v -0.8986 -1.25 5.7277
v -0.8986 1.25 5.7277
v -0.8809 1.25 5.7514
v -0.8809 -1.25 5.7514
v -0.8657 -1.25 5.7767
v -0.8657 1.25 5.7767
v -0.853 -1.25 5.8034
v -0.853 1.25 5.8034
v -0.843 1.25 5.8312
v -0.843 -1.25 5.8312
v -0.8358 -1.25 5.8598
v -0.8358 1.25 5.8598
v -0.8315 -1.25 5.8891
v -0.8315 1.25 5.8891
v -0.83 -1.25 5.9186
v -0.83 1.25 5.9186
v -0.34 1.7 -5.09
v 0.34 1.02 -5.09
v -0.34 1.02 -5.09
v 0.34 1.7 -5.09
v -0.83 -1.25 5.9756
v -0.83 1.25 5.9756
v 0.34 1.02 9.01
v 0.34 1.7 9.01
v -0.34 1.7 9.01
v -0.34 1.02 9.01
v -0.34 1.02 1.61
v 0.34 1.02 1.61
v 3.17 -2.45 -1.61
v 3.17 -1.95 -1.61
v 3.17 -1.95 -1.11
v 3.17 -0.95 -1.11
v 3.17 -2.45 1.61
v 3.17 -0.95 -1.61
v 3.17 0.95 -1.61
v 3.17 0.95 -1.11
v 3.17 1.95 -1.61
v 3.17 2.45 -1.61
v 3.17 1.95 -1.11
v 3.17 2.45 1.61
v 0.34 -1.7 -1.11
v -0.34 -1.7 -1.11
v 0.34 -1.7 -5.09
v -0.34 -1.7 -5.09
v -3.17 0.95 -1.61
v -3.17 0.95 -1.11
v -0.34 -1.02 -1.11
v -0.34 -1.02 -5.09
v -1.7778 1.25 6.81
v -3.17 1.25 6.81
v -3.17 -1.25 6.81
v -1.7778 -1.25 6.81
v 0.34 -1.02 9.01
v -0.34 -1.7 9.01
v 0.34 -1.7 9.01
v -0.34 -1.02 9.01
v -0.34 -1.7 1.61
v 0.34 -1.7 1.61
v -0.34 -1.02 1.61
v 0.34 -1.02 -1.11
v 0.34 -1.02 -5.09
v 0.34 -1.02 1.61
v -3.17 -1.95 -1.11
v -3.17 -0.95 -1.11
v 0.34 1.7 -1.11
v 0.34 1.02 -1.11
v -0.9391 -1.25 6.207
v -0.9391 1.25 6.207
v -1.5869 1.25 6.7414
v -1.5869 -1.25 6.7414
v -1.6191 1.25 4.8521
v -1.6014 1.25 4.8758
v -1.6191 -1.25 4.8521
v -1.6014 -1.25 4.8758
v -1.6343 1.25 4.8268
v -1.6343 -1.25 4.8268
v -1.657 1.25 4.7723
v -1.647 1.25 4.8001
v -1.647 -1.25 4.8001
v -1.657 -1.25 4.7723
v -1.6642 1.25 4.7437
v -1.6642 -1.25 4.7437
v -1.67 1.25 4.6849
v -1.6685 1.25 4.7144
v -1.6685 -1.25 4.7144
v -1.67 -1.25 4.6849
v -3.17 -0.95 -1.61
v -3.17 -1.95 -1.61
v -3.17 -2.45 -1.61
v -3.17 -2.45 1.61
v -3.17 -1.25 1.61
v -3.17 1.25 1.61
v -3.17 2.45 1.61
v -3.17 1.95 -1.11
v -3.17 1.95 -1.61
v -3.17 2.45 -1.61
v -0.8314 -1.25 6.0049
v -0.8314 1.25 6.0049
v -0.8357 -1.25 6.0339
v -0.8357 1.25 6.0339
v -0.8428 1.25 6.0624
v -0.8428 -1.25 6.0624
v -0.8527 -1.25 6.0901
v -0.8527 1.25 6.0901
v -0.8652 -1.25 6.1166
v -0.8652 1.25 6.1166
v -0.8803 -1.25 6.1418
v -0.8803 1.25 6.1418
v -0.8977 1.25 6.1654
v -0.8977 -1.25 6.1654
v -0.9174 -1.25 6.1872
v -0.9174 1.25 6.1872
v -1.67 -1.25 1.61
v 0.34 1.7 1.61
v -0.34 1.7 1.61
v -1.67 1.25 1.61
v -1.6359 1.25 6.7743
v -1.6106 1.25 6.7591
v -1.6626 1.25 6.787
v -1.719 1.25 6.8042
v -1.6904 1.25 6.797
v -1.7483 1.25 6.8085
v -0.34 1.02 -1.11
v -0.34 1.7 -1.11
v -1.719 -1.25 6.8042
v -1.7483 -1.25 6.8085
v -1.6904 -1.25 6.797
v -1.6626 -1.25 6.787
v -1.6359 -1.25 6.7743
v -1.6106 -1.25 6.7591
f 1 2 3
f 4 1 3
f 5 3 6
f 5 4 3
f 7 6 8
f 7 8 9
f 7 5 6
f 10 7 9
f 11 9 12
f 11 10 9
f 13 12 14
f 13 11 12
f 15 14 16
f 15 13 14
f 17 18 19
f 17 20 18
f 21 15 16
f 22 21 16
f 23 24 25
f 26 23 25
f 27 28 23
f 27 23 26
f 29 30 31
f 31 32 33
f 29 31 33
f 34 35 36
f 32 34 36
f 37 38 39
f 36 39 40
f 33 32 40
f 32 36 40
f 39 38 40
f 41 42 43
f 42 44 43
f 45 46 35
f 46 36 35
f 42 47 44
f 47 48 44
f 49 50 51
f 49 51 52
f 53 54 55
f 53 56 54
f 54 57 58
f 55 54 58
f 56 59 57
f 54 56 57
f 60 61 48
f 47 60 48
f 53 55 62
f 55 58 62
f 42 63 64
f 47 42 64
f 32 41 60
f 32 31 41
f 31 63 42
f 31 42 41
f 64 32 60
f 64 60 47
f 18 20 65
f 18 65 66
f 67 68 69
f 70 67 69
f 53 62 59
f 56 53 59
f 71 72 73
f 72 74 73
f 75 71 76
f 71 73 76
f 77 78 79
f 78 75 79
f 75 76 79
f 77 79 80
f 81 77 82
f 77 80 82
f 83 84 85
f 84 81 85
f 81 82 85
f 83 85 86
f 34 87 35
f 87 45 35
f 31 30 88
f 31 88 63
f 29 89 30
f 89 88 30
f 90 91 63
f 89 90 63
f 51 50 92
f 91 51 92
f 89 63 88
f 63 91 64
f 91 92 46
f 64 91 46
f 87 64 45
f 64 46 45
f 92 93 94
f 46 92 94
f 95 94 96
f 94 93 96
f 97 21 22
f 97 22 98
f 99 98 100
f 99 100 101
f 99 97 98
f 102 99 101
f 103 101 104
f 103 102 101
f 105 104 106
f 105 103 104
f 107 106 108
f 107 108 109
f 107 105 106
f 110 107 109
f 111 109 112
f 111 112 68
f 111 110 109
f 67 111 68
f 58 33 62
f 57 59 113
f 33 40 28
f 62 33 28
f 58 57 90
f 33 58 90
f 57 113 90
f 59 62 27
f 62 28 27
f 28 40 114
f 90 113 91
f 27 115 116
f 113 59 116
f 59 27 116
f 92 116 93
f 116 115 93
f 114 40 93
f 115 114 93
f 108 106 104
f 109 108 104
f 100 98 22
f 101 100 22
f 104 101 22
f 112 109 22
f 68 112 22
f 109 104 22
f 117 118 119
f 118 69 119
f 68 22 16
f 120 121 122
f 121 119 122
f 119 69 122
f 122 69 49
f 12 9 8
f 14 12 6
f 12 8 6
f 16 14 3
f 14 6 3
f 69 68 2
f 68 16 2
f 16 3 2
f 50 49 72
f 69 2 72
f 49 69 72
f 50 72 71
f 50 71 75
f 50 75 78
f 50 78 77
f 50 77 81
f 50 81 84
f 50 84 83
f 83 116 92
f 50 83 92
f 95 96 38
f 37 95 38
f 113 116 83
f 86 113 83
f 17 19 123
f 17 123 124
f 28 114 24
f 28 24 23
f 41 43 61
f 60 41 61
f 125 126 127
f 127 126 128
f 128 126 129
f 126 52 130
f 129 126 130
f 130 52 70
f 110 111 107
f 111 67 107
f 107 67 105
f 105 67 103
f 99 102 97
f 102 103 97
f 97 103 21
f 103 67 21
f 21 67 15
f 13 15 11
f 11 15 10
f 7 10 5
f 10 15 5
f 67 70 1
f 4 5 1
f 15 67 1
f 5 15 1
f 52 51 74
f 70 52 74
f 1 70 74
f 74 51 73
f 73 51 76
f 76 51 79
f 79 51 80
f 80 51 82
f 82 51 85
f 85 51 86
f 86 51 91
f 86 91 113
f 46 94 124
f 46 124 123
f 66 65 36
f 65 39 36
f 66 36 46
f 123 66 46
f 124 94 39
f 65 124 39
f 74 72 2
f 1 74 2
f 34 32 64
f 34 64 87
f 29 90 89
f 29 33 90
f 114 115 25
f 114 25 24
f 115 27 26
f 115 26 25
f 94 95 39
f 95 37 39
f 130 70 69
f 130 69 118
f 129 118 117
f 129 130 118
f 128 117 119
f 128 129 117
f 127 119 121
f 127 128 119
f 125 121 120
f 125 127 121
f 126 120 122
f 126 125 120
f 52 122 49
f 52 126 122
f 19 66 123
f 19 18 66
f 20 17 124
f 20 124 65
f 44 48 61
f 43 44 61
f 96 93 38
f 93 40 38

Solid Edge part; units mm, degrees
sketch "Sketch1" plane through (0, 0, 0) normal (0, -1, 0) x (1, 0, 0)
  line L0 (-3.17, -1.61) -> (3.17, -1.61)
  line L1 (3.17, -1.61) -> (3.17, 1.61)
  line L2 (3.17, 1.61) -> (-3.17, 1.61)
  line L3 (-3.17, 1.61) -> (-3.17, -1.61)
extrude "Protrusion1" add sketch "Sketch1" along normal mid plane 4.9
sketch "Sketch2" plane through (0, 0, 1.61) normal (0, 0, 1) x (1, 0, 0)
  line L0 (-3.17, -1.25) -> (-0.83, -1.25)
  line L1 (-0.83, -1.25) -> (-0.83, 1.25)
  line L2 (-0.83, 1.25) -> (-3.17, 1.25)
  line L3 (-3.17, 1.25) -> (-3.17, -1.25)
  dimension "D1" = 2.34
extrude "ExtrudedProtrusion_2" add sketch "Sketch2" along normal blind 5.2 and the other way blind 1.7629
sketch "Sketch3" plane through (3.17, 0, 0) normal (1, 0, 0) x (0, 1, 0)
  line L0 (-1.95, -1.11) -> (-0.95, -1.11)
  line L1 (-0.95, -1.11) -> (-0.95, -1.61)
  line L2 (-0.95, -1.61) -> (-1.95, -1.61)
  line L3 (-1.95, -1.61) -> (-1.95, -1.11)
  line L4 (1.95, -1.11) -> (0.95, -1.11)
  line L5 (0.95, -1.11) -> (0.95, -1.61)
  line L6 (0.95, -1.61) -> (1.95, -1.61)
  line L7 (1.95, -1.61) -> (1.95, -1.11)
  dimension "D1" = 1
  dimension "D2" = 0.5
  dimension "D3" = 0.5
extrude "Cutout1" cut sketch "Sketch3" against normal up to surface (6.34 mm away)
sketch "Sketch4" plane through (0, 0, 1.61) normal (0, 0, 1) x (0, 1, 0)
  line L0 (-1.7, -0.34) -> (-1.02, -0.34)
  line L1 (-1.02, -0.34) -> (-1.02, 0.34)
  line L2 (-1.02, 0.34) -> (-1.7, 0.34)
  line L3 (-1.7, 0.34) -> (-1.7, -0.34)
  line L4 (1.7, -0.34) -> (1.02, -0.34)
  line L5 (1.02, -0.34) -> (1.02, 0.34)
  line L6 (1.02, 0.34) -> (1.7, 0.34)
  line L7 (1.7, 0.34) -> (1.7, -0.34)
  dimension "D1" = 0.68
  dimension "D2" = 0.68
  dimension "D3" = 0.75
extrude "ExtrudedProtrusion_3" add sketch "Sketch4" along normal blind 7.4 and the other way blind 6.7
sketch "Sketch5" plane through (-2, 1.25, 4.21) normal (0, 1, 0) x (-1, 0, 0)
  line L0 (-0.33, 2.6) -> (-1.17, 2.6)
  line L1 (-1.17, 2.6) -> (-1.17, 1.907)
  line L2 (-1.17, 1.907) -> (-0.33, 2.6)
  line L3 (-0.33, 0.5827) -> (-1.17, 1.6008)
  line L4 (-1.17, 1.6008) -> (-1.17, -2.6)
  line L5 (-1.17, -2.6) -> (-0.33, -2.6)
  line L6 (-0.33, -2.6) -> (-0.33, 0.5827)
  dimension "D1" = 1.5
extrude "Cutout2" cut sketch "Sketch5" against normal up to surface (2.5 mm away)
fillet "Round_1" radius 0.3 4 edges at (-0.83, 0, 6.117) (-1.67, 0, 6.81) (-0.83, 0, 5.8108) (-1.67, 0, 4.7927)
